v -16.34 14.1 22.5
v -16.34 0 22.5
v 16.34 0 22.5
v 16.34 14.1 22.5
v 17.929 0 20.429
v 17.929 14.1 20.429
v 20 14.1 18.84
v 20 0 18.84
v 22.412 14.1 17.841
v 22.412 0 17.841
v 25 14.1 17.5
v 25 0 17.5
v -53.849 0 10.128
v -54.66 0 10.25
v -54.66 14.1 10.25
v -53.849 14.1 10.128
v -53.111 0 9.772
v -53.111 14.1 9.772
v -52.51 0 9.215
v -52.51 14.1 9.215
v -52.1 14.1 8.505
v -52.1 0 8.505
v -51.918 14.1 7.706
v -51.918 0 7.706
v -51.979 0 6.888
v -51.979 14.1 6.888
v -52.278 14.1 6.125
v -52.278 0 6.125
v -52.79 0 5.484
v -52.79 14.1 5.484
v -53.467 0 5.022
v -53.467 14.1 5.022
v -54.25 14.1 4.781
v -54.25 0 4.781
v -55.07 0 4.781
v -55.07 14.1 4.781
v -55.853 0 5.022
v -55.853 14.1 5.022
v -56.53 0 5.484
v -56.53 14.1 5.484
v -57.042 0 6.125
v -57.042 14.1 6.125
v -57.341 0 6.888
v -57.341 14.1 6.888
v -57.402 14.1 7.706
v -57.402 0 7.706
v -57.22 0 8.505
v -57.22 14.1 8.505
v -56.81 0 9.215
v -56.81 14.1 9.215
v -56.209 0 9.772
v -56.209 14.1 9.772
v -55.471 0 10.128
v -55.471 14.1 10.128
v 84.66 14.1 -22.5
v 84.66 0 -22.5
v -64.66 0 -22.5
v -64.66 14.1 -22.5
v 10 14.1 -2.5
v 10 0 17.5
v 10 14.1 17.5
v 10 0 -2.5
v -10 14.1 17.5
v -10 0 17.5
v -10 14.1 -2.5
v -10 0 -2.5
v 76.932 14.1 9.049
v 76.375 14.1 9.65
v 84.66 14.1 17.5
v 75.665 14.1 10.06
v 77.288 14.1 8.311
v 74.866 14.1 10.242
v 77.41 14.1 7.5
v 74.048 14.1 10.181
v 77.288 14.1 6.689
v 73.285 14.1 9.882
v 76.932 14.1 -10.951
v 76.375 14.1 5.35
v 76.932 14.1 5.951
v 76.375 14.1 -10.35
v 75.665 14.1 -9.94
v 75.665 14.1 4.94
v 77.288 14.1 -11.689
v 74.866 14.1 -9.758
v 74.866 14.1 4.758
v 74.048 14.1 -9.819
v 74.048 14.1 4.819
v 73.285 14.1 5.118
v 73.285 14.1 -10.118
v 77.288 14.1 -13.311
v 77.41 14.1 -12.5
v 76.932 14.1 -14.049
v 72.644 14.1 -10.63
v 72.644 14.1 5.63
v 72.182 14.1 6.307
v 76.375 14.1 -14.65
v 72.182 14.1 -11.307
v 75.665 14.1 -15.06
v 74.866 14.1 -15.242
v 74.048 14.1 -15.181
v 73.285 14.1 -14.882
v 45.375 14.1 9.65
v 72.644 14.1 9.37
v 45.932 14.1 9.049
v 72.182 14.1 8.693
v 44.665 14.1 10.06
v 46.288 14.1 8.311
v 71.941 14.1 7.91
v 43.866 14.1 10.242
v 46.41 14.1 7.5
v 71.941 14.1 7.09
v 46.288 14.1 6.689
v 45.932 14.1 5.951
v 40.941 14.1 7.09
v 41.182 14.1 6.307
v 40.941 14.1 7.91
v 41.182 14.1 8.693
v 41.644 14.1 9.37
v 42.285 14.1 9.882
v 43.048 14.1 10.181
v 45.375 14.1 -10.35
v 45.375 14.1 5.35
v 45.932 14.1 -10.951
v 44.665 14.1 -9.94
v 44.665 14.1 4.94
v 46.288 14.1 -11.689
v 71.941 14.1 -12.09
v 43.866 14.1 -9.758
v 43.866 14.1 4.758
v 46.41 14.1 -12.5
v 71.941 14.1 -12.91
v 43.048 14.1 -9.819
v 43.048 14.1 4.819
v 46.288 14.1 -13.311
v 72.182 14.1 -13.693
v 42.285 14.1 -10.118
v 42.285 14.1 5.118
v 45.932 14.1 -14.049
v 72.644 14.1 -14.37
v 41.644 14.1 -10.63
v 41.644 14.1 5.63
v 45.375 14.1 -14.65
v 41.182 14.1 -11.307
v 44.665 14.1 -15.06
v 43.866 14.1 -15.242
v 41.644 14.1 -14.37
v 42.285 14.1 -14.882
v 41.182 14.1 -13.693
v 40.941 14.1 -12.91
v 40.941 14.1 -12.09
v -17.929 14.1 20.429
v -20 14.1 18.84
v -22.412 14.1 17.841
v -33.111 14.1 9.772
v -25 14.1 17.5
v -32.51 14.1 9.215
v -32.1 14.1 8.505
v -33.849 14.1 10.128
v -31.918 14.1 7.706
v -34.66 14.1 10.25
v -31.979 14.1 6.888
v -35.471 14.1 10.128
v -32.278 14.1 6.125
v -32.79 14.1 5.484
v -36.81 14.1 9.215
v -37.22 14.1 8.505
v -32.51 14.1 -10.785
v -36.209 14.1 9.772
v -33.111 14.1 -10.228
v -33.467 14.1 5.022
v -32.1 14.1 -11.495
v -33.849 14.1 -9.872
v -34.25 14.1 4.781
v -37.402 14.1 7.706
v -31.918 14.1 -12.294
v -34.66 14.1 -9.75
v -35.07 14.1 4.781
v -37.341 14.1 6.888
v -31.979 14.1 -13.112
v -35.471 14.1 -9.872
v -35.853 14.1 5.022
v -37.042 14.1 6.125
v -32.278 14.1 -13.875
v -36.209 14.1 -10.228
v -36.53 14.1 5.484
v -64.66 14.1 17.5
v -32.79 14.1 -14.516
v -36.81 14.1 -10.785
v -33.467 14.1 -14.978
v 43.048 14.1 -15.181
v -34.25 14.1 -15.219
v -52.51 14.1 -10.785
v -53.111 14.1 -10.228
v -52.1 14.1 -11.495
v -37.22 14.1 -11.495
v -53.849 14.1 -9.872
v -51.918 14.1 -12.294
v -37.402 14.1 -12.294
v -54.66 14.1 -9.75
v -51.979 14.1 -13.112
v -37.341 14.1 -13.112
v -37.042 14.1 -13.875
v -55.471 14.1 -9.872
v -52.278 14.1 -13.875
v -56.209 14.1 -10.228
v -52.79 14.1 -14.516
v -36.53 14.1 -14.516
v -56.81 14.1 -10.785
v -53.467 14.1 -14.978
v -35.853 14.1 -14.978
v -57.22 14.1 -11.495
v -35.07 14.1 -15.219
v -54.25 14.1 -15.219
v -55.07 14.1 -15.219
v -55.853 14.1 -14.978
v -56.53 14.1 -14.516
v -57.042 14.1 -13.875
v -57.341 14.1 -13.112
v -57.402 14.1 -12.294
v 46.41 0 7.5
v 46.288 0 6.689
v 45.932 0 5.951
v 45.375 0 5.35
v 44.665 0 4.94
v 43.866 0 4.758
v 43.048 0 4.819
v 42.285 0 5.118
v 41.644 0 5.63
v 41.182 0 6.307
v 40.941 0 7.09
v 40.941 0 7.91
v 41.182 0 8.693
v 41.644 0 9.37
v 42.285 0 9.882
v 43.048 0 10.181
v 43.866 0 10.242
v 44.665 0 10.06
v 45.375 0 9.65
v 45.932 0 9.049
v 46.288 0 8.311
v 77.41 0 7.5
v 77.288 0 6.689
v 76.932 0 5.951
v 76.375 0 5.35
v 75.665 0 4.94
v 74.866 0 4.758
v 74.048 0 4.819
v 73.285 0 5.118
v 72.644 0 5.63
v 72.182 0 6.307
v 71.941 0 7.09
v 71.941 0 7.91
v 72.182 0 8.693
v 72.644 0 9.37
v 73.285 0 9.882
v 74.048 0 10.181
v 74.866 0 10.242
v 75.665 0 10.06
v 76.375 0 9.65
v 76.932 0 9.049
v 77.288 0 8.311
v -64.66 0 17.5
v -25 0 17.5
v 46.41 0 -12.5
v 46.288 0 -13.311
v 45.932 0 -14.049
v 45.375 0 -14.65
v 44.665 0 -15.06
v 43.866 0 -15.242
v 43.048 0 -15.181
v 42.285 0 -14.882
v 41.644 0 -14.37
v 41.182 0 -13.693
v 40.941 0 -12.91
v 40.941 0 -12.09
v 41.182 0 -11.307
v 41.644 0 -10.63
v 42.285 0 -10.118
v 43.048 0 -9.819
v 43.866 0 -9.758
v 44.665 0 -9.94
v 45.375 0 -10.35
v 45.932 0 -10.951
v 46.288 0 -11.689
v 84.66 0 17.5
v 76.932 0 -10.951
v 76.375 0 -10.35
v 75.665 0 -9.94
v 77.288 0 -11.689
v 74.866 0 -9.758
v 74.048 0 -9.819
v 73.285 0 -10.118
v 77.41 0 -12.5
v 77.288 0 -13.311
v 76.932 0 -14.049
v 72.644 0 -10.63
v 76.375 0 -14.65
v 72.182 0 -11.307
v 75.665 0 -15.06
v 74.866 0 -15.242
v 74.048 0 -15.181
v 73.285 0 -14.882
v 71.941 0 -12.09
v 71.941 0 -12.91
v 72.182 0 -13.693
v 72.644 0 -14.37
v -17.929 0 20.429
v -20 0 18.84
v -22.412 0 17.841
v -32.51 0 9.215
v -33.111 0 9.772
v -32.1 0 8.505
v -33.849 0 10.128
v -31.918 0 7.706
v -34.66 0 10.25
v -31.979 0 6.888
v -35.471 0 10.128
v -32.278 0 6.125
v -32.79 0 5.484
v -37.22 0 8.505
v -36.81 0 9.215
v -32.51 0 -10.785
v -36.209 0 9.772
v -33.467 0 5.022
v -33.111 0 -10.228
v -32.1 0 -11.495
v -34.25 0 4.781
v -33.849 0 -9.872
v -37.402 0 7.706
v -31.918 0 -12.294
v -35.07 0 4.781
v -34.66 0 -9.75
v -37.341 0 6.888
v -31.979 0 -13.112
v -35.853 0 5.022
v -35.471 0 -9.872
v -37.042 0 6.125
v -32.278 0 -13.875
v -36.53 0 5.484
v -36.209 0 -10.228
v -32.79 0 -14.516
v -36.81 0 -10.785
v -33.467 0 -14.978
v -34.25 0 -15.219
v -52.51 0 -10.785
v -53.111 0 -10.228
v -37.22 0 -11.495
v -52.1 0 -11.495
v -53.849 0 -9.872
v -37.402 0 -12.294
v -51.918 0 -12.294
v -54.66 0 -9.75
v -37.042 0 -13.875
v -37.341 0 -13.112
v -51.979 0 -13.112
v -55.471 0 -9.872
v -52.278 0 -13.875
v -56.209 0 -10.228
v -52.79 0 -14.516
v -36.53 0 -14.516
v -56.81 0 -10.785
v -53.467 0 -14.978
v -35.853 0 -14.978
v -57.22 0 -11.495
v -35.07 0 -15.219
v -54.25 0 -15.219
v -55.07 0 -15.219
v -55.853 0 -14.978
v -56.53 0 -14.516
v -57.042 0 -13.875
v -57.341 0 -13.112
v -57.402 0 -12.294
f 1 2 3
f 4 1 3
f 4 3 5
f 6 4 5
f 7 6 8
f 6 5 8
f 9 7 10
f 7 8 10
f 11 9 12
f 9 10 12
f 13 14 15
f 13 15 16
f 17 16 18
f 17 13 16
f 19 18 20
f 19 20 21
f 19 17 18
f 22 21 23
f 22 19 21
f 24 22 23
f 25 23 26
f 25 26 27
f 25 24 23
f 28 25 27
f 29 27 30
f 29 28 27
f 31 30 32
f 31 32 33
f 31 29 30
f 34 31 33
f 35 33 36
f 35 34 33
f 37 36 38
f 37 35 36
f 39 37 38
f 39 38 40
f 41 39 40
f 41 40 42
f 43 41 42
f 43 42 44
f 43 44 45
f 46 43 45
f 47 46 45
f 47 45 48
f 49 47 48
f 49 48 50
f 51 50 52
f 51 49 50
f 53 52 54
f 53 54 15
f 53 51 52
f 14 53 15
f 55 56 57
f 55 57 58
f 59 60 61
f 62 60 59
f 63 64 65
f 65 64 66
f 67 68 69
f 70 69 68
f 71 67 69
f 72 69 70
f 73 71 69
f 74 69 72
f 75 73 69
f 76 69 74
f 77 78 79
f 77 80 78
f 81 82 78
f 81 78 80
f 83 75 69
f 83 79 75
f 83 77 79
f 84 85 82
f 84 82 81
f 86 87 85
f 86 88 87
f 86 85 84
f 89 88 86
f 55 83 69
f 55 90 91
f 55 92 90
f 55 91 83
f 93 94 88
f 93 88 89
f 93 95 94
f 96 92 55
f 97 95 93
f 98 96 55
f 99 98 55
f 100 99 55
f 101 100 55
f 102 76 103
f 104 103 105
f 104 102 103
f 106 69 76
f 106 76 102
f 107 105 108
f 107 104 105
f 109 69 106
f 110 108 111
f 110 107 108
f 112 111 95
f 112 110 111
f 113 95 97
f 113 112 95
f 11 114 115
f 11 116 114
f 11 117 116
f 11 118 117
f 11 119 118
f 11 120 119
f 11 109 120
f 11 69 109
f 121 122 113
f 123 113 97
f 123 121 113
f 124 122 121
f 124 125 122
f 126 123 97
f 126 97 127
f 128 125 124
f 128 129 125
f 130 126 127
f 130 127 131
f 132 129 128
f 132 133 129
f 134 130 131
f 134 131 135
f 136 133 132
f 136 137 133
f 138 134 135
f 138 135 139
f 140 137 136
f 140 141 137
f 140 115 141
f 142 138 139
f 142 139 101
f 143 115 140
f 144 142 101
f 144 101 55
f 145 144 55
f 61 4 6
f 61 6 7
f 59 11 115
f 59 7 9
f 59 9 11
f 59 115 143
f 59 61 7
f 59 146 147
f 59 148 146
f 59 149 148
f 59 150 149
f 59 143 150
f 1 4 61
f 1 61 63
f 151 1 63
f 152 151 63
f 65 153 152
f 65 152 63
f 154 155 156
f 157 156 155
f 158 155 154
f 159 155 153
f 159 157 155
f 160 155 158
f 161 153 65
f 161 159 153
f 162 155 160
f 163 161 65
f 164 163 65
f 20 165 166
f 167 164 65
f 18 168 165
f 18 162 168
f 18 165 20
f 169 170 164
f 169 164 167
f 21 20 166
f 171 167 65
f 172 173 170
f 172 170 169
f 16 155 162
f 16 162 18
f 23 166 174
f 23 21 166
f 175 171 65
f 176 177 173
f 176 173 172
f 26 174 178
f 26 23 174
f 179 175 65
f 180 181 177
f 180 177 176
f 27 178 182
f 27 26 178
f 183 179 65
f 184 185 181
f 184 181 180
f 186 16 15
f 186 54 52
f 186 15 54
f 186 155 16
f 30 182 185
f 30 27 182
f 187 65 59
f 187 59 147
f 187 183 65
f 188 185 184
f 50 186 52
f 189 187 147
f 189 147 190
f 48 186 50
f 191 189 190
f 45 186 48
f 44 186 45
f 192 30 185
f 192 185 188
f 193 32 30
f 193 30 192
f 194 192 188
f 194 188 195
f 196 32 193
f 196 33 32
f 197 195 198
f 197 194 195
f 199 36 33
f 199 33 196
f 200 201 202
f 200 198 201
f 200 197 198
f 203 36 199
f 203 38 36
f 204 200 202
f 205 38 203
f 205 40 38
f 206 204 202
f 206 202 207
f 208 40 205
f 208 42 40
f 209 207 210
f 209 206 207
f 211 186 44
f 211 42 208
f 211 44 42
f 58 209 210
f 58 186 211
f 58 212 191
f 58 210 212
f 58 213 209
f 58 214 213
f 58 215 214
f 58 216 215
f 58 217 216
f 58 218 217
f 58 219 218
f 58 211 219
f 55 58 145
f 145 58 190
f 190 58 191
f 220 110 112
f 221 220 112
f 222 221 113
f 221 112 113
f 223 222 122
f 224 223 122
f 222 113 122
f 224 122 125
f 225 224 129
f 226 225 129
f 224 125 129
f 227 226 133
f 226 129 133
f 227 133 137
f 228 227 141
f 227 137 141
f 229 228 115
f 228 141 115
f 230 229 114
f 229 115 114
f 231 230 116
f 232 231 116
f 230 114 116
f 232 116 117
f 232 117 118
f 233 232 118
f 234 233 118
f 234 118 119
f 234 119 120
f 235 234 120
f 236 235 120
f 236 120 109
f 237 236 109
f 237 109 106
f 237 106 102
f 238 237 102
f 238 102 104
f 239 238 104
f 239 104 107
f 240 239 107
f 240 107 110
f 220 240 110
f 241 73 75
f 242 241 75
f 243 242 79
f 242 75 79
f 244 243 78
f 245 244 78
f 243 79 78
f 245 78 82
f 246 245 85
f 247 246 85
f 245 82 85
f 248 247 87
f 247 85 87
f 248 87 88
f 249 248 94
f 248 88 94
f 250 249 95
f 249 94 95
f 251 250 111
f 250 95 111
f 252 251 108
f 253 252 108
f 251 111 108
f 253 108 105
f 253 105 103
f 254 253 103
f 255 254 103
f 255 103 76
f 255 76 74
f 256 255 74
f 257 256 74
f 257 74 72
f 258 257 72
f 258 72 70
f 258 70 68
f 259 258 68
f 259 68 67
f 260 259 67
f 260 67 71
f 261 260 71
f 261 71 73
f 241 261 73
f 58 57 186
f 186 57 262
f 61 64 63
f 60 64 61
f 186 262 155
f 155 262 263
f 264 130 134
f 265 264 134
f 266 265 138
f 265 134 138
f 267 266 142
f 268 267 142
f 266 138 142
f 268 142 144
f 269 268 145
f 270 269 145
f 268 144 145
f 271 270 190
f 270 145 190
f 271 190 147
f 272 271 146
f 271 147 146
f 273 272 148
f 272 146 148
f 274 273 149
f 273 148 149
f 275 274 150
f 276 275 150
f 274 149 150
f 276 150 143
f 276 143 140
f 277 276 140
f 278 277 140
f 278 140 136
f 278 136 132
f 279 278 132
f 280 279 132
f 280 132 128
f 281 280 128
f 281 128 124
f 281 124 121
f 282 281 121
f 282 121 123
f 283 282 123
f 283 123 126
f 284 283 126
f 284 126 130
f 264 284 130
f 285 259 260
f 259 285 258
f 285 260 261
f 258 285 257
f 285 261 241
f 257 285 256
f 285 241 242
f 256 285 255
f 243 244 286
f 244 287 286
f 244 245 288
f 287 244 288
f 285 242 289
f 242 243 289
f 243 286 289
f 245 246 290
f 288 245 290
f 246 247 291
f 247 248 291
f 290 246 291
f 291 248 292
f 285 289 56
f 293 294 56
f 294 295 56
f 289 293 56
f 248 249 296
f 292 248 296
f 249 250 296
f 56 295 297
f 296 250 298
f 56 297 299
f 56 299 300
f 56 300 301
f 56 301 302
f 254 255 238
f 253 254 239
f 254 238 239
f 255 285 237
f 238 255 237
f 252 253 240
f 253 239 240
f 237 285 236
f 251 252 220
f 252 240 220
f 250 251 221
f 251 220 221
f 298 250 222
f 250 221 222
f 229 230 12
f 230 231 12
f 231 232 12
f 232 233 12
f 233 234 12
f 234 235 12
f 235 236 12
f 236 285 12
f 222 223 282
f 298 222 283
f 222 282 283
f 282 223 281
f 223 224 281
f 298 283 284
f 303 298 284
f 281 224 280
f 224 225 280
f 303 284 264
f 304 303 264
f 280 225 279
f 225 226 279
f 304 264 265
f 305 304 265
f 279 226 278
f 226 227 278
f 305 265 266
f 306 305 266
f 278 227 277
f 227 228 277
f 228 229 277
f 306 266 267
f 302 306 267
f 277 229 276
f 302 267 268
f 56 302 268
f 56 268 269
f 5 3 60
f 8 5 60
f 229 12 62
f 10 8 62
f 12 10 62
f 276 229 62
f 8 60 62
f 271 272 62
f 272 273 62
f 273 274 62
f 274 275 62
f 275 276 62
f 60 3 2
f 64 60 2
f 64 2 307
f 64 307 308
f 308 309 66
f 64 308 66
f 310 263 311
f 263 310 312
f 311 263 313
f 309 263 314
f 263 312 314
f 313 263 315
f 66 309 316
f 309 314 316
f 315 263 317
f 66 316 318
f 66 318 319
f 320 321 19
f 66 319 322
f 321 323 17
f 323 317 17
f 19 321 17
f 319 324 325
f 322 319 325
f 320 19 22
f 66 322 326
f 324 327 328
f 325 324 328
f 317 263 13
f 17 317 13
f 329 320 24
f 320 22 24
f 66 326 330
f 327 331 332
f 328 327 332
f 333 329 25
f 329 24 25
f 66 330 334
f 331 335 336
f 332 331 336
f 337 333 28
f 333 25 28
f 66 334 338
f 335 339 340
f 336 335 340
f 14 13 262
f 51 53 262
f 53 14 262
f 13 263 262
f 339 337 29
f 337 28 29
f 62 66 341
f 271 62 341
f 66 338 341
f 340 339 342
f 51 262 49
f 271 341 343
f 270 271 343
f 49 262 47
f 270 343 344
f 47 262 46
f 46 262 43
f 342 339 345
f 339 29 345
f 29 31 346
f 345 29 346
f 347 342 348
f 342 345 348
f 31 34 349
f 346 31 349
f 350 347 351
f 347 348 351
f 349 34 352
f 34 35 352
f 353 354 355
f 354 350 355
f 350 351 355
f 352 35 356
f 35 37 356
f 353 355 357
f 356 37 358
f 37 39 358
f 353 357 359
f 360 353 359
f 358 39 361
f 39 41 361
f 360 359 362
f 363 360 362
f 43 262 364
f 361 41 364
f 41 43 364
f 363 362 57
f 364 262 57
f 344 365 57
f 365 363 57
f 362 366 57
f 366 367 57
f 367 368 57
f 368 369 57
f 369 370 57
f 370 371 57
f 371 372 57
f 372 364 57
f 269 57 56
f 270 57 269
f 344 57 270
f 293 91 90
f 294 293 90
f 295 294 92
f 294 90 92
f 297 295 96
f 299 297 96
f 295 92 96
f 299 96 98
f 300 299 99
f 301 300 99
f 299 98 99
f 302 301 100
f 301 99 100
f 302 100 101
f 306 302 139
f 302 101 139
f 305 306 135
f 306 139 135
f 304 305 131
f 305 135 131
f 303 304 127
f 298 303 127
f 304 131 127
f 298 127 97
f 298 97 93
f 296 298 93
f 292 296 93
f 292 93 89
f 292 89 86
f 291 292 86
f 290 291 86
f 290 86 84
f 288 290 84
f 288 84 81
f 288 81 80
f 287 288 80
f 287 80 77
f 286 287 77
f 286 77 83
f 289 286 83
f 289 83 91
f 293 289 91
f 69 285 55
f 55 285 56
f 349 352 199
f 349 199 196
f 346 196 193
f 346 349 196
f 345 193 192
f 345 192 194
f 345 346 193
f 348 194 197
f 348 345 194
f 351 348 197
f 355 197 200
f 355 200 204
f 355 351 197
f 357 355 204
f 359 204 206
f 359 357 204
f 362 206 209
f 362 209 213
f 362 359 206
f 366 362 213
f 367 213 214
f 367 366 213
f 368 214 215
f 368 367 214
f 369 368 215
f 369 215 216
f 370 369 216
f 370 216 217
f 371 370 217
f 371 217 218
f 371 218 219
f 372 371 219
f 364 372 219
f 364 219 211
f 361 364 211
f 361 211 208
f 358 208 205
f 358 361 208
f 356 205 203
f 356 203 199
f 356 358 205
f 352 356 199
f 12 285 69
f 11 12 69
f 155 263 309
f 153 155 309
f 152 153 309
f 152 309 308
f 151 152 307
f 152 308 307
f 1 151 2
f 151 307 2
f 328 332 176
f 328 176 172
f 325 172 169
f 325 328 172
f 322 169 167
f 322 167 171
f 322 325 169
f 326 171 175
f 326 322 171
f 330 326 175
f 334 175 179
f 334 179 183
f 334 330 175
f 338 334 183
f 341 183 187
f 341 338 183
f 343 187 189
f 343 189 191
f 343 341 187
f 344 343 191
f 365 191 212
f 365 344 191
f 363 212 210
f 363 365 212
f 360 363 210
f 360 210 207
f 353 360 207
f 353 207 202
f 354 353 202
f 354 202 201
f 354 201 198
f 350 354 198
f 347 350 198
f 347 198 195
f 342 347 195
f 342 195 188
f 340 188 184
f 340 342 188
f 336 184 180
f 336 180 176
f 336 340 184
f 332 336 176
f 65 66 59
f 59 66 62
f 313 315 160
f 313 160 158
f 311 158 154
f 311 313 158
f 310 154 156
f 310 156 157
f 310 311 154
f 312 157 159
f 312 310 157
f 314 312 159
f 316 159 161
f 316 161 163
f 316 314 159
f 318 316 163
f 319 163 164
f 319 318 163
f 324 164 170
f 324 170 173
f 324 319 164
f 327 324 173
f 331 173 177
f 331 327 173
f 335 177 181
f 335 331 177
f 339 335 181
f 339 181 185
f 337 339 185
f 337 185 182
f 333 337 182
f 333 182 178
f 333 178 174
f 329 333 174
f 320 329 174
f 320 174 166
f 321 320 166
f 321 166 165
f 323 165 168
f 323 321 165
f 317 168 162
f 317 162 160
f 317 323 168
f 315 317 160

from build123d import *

# Parameters (mm, degrees)
SKETCH1_R            = 2.75
SKETCH1_W            = 20
SKETCH1_H            = 20
BOSS_EXTRUDE1_DEPTH  = 14.1
MOVE_FACE1_BY        = 20
SKETCH6_W            = 30.987343285
SKETCH6_H            = 33.189068773
BOSS_EXTRUDE2_DEPTH  = 14.1
M5_CLEARANCE_HOLE2_D = 5.5


with BuildPart() as part:
    # Sketch1 → Boss-Extrude1 (new body)
    with BuildSketch(Plane(origin=(0, 0, 0), x_dir=(1, 0, 0), z_dir=(0, 1, 0))):
        with BuildLine():
            Line((10, -22.5), (16.339745962, -22.5))
            ThreePointArc((16.339745962, -22.5), (20, -18.839745962), (25, -17.5))
            Line((25, -17.5), (64.66, -17.5))
            Line((64.66, -17.5), (64.66, 22.5))
            Line((64.66, 22.5), (-64.66, 22.5))
            Line((-64.66, 22.5), (-64.66, -17.5))
            Line((-64.66, -17.5), (-25, -17.5))
            ThreePointArc((-25, -17.5), (-20, -18.839745962), (-16.339745962, -22.5))
            Line((-16.339745962, -22.5), (-10, -22.5))
            Line((-10, -22.5), (10, -22.5))
        make_face()
        with Locations(Location((34.66, 12.5, 0), (0, 0, 270))):
            Circle(SKETCH1_R, mode=Mode.SUBTRACT)
        with Locations(Location((34.66, -7.5, 0), (0, 0, 270))):
            Circle(SKETCH1_R, mode=Mode.SUBTRACT)
        with Locations(Location((54.66, -7.5, 0), (0, 0, 270))):
            Circle(SKETCH1_R, mode=Mode.SUBTRACT)
        with Locations(Location((54.66, 12.5, 0), (0, 0, 270))):
            Circle(SKETCH1_R, mode=Mode.SUBTRACT)
        with Locations(Location((-54.66, -7.5, 0), (0, 0, 270))):
            Circle(SKETCH1_R, mode=Mode.SUBTRACT)
        with Locations(Location((-34.66, 12.5, 0), (0, 0, 270))):
            Circle(SKETCH1_R, mode=Mode.SUBTRACT)
        with Locations(Location((-54.66, 12.5, 0), (0, 0, 270))):
            Circle(SKETCH1_R, mode=Mode.SUBTRACT)
        with Locations(Location((-34.66, -7.5, 0), (0, 0, 270))):
            Circle(SKETCH1_R, mode=Mode.SUBTRACT)
        with Locations((0, -7.5)):
            Rectangle(SKETCH1_W, SKETCH1_H, mode=Mode.SUBTRACT)
    extrude(amount=BOSS_EXTRUDE1_DEPTH)

    # Move Face1: a face moved outward by 20.0
    extrude(part.faces().sort_by_distance((64.66, 7.05, -2.5))[0], amount=MOVE_FACE1_BY, dir=(1, 0, 0))

    # Sketch6 → Boss-Extrude2 (add)
    with BuildSketch(Plane.XZ):
        with Locations((43.846371015, -2.215029501)):
            Rectangle(SKETCH6_W, SKETCH6_H)
    extrude(amount=-BOSS_EXTRUDE2_DEPTH)

    # M5 Clearance Hole2 (through all)
    with Locations(Plane(origin=(0, 0, 0), x_dir=(-1, 0, 0), z_dir=(0, -1, 0))):
        with Locations((-74.66, -7.5), (-43.66, -7.5), (-43.66, 12.5), (-74.66, 12.5)):
            Hole(M5_CLEARANCE_HOLE2_D / 2)


solid = part.part
